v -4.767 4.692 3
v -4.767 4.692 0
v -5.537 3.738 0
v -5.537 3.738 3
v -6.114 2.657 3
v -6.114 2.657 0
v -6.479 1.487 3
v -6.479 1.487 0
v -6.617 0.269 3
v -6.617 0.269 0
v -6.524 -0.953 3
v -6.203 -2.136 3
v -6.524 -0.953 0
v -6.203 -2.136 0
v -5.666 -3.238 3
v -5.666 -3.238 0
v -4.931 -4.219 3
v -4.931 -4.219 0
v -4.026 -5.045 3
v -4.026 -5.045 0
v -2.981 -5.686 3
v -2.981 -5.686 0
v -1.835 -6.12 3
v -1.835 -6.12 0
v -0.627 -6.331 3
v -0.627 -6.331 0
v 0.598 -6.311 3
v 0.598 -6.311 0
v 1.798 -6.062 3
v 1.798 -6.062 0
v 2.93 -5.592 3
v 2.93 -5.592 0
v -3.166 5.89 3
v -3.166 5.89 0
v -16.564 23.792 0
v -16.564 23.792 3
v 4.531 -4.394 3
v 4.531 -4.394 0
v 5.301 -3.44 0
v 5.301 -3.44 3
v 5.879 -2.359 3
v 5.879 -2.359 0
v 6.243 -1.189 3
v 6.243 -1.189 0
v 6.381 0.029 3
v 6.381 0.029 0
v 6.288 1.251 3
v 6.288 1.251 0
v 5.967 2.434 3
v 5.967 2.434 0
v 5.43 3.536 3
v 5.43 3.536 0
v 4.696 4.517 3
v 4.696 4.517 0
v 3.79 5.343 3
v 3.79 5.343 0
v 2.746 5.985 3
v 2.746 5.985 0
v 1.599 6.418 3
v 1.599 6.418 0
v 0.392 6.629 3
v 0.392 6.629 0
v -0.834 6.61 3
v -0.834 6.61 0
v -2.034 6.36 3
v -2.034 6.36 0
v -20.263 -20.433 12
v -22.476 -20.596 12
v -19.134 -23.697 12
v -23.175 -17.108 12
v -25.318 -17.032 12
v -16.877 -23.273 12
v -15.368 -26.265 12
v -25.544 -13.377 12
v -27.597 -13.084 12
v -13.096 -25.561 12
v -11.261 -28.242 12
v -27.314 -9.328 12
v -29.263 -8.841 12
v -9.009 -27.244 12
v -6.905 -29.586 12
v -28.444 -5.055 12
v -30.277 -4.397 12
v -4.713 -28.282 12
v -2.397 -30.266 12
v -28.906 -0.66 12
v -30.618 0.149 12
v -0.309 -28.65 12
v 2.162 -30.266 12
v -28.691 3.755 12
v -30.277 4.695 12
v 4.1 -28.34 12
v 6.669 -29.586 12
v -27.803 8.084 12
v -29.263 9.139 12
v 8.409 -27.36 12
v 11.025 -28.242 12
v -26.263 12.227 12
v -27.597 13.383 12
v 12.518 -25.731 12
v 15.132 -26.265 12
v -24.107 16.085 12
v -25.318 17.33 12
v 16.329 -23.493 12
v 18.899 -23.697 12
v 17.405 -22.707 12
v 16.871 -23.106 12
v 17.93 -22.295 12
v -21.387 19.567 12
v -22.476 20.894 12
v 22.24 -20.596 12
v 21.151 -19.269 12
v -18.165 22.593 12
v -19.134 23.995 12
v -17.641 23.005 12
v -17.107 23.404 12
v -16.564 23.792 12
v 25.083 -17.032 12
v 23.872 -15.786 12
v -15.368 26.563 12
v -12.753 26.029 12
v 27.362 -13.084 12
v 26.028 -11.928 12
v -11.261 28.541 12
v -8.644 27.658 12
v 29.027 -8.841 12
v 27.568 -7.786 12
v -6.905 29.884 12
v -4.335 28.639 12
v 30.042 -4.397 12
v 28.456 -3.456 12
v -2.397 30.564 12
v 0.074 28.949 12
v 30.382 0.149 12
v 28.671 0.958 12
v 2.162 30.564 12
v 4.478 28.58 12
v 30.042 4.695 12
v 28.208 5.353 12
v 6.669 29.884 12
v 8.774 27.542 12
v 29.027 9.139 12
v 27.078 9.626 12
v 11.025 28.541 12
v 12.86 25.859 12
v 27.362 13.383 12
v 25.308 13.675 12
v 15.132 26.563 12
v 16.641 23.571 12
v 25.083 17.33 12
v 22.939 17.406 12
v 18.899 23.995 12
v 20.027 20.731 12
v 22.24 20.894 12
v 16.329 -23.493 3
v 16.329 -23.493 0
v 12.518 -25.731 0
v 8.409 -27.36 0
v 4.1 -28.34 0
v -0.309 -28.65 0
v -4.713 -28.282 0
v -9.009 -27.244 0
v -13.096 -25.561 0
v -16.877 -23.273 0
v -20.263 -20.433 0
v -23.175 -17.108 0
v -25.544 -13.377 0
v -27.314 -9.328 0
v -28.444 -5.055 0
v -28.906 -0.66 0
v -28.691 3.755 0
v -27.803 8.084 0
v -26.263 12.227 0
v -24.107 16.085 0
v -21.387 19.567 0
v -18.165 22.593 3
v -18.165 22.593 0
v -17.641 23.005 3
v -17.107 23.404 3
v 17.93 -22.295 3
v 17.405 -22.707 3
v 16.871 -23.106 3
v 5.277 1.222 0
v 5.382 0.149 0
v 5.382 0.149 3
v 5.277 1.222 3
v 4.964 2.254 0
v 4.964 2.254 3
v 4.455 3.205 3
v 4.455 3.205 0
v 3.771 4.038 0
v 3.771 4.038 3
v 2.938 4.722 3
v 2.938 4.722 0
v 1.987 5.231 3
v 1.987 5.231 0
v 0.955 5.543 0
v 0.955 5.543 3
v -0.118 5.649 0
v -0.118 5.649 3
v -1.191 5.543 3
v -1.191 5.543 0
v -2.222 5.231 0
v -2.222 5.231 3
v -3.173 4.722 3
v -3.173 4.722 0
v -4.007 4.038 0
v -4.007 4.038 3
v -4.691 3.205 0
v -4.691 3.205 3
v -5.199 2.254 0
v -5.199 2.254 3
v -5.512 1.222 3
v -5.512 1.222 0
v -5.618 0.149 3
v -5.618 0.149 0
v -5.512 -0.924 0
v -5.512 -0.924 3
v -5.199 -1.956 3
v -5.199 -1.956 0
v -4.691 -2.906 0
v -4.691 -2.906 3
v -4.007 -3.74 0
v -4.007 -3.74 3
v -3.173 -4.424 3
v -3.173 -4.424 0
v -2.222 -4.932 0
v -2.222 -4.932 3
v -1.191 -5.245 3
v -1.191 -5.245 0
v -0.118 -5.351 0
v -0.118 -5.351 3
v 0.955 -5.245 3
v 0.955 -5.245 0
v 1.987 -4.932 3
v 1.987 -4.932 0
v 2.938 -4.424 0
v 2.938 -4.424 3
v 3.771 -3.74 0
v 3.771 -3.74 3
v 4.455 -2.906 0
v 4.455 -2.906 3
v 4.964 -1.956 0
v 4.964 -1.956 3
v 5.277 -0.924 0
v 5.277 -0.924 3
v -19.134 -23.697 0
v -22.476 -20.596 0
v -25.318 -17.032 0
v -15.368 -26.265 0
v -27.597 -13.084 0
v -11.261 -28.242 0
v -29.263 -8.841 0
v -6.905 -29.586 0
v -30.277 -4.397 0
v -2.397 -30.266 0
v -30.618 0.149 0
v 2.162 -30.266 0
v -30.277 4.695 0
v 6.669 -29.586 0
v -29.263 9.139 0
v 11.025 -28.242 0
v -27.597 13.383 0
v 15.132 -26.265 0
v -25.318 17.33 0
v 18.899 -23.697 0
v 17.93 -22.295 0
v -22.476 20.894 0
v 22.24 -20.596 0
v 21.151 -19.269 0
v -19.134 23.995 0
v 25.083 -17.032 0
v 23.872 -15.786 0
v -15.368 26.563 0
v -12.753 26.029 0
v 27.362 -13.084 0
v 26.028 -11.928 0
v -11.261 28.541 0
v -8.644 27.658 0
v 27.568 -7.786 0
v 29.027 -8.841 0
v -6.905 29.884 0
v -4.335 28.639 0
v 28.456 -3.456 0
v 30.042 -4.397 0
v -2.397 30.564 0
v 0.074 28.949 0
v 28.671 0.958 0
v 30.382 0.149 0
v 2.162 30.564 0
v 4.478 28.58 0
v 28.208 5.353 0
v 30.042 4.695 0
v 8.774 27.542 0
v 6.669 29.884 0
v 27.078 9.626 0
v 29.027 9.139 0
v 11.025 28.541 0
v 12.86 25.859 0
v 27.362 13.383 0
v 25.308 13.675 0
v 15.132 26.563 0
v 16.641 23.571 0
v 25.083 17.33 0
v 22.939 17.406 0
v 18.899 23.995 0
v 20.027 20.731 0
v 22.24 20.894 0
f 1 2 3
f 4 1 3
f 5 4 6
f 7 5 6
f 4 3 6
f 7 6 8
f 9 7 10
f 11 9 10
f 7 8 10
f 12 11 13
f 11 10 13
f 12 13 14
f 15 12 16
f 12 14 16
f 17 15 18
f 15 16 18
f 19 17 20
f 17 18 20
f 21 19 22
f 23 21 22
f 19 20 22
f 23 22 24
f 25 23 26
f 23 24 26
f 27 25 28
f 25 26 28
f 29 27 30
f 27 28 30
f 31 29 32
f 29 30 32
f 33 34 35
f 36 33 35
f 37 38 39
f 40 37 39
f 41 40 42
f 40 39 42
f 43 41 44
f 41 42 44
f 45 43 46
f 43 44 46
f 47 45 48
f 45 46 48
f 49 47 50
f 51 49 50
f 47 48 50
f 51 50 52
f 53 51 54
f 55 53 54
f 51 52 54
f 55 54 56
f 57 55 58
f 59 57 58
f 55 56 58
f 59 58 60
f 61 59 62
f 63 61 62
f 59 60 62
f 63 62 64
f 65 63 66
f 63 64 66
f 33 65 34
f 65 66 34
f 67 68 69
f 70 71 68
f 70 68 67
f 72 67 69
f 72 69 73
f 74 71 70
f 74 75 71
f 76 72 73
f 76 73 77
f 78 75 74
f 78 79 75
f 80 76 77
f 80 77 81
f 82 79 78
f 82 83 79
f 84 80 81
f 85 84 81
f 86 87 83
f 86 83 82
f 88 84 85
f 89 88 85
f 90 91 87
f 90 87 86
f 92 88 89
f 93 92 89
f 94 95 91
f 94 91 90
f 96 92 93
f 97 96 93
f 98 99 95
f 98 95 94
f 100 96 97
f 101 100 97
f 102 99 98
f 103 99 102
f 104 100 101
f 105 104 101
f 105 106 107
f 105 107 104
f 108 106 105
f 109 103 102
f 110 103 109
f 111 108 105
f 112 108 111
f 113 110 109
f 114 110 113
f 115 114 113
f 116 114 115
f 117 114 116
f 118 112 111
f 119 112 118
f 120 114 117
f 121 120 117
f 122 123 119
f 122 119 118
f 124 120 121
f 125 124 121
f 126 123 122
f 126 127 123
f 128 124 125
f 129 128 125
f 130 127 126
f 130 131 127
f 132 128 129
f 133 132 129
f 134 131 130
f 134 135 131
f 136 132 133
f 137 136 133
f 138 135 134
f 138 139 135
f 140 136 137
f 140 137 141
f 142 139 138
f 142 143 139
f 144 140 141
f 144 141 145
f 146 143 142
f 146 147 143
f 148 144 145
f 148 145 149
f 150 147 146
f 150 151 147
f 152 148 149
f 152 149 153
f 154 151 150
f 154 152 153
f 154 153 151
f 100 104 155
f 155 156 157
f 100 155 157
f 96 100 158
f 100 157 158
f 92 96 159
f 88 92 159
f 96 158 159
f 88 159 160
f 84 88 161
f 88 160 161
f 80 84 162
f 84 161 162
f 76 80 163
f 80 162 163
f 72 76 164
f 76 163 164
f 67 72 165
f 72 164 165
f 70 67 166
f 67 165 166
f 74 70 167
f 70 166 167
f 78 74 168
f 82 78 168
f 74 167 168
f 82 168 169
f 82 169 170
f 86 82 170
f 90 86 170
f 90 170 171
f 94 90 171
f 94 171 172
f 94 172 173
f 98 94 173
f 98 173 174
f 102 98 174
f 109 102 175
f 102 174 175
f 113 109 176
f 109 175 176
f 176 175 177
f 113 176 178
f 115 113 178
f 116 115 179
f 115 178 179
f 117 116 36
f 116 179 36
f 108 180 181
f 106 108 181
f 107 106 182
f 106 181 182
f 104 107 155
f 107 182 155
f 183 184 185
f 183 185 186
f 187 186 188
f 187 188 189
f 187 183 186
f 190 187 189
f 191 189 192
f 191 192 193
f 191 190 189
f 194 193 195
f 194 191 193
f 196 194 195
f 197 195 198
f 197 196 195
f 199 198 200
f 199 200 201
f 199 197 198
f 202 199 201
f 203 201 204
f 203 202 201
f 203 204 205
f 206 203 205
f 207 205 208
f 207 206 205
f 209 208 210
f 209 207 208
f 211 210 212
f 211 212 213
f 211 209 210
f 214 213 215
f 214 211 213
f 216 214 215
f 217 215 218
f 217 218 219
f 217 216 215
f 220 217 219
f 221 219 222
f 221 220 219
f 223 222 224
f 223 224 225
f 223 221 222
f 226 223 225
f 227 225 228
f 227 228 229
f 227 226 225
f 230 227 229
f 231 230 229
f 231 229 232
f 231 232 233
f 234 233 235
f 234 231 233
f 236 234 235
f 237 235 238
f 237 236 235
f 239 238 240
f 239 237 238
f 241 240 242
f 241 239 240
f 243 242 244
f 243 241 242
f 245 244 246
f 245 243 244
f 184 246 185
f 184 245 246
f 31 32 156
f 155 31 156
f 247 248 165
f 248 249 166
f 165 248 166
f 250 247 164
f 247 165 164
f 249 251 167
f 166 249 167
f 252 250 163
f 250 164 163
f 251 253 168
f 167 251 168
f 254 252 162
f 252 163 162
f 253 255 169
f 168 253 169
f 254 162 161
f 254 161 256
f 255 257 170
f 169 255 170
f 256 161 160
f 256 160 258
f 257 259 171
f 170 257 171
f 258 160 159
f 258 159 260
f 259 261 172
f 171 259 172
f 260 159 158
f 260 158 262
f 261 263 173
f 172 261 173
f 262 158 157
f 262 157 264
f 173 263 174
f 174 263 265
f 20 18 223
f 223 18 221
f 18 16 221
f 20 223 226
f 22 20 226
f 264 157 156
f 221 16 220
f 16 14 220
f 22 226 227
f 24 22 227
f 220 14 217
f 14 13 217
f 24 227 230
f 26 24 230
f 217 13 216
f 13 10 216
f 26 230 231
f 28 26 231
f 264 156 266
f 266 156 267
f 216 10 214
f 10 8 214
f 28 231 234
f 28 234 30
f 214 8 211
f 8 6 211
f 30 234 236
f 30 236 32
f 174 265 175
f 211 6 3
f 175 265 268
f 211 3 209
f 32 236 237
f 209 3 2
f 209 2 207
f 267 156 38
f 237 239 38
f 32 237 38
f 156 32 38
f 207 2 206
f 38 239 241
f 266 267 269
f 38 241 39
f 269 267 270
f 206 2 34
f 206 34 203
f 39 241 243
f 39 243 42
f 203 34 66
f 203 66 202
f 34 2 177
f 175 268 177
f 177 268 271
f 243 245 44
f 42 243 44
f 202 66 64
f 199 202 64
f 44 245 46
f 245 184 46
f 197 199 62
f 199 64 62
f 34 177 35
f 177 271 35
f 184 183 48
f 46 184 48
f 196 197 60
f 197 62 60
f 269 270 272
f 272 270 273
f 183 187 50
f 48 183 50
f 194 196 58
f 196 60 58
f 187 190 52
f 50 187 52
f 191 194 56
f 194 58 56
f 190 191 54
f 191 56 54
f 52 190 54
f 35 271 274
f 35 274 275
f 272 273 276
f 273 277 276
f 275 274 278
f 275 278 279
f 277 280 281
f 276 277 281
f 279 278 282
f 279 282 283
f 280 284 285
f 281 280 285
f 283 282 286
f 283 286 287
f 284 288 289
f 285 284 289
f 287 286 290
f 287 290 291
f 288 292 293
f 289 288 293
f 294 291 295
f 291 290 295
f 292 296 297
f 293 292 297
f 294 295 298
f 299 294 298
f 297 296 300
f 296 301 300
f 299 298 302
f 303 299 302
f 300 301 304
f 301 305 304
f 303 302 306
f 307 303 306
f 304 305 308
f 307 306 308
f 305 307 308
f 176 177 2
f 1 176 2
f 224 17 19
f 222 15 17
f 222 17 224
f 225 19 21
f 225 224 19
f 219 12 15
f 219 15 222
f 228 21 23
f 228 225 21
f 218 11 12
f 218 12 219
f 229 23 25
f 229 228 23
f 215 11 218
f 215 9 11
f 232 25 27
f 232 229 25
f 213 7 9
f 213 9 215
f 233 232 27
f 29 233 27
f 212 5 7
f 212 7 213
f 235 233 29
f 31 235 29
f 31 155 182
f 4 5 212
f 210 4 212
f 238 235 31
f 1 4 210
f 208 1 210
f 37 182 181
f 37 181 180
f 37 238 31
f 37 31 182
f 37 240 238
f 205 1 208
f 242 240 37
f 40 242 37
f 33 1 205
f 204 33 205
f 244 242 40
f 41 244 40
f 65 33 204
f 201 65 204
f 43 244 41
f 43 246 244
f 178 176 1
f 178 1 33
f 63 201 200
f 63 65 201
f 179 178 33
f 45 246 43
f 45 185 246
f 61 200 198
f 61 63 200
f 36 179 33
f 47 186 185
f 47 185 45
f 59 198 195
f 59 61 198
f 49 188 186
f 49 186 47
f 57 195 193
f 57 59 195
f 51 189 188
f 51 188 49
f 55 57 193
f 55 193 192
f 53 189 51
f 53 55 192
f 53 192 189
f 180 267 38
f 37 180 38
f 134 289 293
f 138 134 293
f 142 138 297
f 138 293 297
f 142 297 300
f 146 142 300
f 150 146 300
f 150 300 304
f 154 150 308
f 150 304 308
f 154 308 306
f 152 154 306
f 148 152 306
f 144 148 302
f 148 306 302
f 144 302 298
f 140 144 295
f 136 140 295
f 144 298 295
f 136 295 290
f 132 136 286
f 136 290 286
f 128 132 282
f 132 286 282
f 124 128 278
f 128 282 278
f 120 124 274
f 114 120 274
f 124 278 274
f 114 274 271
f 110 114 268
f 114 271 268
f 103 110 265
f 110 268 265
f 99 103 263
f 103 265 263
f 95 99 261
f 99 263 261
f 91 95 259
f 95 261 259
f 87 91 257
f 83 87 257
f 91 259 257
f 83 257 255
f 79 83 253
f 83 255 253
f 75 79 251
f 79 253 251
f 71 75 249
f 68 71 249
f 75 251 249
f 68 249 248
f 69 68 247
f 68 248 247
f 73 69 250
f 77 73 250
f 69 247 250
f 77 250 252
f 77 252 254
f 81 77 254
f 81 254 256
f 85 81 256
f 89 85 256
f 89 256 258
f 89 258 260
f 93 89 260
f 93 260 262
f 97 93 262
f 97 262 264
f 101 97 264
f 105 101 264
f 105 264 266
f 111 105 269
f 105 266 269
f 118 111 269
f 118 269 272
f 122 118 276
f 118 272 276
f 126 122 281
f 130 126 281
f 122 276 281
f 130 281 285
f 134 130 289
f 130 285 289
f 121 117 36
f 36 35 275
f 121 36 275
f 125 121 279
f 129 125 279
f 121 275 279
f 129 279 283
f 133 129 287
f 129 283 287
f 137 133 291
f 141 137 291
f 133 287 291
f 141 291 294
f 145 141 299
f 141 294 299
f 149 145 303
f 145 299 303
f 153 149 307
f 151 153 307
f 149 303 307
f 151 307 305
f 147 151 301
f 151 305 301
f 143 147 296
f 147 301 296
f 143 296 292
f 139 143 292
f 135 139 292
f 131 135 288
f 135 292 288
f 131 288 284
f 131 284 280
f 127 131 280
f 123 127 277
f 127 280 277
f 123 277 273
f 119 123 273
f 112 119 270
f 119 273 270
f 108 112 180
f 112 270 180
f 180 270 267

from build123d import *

# Parameters (mm, degrees)
F0_R     = 30.5
F1_DEPTH = 12
F0_R_2   = 5.5
F2_DEPTH = 3


with BuildPart() as f1:
    # F0 (on Top) → F1 (new body)
    with BuildSketch(Plane.XY):
        with Locations((-0.117735, 0.149164)):
            Circle(F0_R)
        with BuildLine():
            ThreePointArc((-18.165188, 22.593082), (-17.375002, 23.206196), (-16.564005, 23.791503))
            ThreePointArc((-16.564005, 23.791503), (22.939297, 17.406431), (17.929717, -22.294755))
            ThreePointArc((17.929717, -22.294755), (17.139532, -22.907869), (16.328534, -23.493176))
            ThreePointArc((16.328534, -23.493176), (-23.174768, -17.108103), (-18.165188, 22.593082))
        make_face(mode=Mode.SUBTRACT)
    extrude(amount=F1_DEPTH)

    # F0 (on Top) → F2 (join)
    with BuildSketch(Plane.XY):
        with BuildLine():
            Line((-3.165644, 5.890266), (-16.564005, 23.791503))
            ThreePointArc((-16.564005, 23.791503), (-17.375002, 23.206196), (-18.165188, 22.593082))
            Line((-18.165188, 22.593082), (-4.766827, 4.691844))
            ThreePointArc((-4.766827, 4.691844), (-5.321579, -3.745706), (2.930173, -5.591938))
            Line((2.930173, -5.591938), (16.328534, -23.493176))
            ThreePointArc((16.328534, -23.493176), (17.139532, -22.907869), (17.929717, -22.294755))
            Line((17.929717, -22.294755), (4.531356, -4.393517))
            ThreePointArc((4.531356, -4.393517), (5.086109, 4.044033), (-3.165644, 5.890266))
        make_face()
        with Locations((-0.117735, 0.149164)):
            Circle(F0_R_2, mode=Mode.SUBTRACT)
    extrude(amount=F2_DEPTH)


solid = f1.part
